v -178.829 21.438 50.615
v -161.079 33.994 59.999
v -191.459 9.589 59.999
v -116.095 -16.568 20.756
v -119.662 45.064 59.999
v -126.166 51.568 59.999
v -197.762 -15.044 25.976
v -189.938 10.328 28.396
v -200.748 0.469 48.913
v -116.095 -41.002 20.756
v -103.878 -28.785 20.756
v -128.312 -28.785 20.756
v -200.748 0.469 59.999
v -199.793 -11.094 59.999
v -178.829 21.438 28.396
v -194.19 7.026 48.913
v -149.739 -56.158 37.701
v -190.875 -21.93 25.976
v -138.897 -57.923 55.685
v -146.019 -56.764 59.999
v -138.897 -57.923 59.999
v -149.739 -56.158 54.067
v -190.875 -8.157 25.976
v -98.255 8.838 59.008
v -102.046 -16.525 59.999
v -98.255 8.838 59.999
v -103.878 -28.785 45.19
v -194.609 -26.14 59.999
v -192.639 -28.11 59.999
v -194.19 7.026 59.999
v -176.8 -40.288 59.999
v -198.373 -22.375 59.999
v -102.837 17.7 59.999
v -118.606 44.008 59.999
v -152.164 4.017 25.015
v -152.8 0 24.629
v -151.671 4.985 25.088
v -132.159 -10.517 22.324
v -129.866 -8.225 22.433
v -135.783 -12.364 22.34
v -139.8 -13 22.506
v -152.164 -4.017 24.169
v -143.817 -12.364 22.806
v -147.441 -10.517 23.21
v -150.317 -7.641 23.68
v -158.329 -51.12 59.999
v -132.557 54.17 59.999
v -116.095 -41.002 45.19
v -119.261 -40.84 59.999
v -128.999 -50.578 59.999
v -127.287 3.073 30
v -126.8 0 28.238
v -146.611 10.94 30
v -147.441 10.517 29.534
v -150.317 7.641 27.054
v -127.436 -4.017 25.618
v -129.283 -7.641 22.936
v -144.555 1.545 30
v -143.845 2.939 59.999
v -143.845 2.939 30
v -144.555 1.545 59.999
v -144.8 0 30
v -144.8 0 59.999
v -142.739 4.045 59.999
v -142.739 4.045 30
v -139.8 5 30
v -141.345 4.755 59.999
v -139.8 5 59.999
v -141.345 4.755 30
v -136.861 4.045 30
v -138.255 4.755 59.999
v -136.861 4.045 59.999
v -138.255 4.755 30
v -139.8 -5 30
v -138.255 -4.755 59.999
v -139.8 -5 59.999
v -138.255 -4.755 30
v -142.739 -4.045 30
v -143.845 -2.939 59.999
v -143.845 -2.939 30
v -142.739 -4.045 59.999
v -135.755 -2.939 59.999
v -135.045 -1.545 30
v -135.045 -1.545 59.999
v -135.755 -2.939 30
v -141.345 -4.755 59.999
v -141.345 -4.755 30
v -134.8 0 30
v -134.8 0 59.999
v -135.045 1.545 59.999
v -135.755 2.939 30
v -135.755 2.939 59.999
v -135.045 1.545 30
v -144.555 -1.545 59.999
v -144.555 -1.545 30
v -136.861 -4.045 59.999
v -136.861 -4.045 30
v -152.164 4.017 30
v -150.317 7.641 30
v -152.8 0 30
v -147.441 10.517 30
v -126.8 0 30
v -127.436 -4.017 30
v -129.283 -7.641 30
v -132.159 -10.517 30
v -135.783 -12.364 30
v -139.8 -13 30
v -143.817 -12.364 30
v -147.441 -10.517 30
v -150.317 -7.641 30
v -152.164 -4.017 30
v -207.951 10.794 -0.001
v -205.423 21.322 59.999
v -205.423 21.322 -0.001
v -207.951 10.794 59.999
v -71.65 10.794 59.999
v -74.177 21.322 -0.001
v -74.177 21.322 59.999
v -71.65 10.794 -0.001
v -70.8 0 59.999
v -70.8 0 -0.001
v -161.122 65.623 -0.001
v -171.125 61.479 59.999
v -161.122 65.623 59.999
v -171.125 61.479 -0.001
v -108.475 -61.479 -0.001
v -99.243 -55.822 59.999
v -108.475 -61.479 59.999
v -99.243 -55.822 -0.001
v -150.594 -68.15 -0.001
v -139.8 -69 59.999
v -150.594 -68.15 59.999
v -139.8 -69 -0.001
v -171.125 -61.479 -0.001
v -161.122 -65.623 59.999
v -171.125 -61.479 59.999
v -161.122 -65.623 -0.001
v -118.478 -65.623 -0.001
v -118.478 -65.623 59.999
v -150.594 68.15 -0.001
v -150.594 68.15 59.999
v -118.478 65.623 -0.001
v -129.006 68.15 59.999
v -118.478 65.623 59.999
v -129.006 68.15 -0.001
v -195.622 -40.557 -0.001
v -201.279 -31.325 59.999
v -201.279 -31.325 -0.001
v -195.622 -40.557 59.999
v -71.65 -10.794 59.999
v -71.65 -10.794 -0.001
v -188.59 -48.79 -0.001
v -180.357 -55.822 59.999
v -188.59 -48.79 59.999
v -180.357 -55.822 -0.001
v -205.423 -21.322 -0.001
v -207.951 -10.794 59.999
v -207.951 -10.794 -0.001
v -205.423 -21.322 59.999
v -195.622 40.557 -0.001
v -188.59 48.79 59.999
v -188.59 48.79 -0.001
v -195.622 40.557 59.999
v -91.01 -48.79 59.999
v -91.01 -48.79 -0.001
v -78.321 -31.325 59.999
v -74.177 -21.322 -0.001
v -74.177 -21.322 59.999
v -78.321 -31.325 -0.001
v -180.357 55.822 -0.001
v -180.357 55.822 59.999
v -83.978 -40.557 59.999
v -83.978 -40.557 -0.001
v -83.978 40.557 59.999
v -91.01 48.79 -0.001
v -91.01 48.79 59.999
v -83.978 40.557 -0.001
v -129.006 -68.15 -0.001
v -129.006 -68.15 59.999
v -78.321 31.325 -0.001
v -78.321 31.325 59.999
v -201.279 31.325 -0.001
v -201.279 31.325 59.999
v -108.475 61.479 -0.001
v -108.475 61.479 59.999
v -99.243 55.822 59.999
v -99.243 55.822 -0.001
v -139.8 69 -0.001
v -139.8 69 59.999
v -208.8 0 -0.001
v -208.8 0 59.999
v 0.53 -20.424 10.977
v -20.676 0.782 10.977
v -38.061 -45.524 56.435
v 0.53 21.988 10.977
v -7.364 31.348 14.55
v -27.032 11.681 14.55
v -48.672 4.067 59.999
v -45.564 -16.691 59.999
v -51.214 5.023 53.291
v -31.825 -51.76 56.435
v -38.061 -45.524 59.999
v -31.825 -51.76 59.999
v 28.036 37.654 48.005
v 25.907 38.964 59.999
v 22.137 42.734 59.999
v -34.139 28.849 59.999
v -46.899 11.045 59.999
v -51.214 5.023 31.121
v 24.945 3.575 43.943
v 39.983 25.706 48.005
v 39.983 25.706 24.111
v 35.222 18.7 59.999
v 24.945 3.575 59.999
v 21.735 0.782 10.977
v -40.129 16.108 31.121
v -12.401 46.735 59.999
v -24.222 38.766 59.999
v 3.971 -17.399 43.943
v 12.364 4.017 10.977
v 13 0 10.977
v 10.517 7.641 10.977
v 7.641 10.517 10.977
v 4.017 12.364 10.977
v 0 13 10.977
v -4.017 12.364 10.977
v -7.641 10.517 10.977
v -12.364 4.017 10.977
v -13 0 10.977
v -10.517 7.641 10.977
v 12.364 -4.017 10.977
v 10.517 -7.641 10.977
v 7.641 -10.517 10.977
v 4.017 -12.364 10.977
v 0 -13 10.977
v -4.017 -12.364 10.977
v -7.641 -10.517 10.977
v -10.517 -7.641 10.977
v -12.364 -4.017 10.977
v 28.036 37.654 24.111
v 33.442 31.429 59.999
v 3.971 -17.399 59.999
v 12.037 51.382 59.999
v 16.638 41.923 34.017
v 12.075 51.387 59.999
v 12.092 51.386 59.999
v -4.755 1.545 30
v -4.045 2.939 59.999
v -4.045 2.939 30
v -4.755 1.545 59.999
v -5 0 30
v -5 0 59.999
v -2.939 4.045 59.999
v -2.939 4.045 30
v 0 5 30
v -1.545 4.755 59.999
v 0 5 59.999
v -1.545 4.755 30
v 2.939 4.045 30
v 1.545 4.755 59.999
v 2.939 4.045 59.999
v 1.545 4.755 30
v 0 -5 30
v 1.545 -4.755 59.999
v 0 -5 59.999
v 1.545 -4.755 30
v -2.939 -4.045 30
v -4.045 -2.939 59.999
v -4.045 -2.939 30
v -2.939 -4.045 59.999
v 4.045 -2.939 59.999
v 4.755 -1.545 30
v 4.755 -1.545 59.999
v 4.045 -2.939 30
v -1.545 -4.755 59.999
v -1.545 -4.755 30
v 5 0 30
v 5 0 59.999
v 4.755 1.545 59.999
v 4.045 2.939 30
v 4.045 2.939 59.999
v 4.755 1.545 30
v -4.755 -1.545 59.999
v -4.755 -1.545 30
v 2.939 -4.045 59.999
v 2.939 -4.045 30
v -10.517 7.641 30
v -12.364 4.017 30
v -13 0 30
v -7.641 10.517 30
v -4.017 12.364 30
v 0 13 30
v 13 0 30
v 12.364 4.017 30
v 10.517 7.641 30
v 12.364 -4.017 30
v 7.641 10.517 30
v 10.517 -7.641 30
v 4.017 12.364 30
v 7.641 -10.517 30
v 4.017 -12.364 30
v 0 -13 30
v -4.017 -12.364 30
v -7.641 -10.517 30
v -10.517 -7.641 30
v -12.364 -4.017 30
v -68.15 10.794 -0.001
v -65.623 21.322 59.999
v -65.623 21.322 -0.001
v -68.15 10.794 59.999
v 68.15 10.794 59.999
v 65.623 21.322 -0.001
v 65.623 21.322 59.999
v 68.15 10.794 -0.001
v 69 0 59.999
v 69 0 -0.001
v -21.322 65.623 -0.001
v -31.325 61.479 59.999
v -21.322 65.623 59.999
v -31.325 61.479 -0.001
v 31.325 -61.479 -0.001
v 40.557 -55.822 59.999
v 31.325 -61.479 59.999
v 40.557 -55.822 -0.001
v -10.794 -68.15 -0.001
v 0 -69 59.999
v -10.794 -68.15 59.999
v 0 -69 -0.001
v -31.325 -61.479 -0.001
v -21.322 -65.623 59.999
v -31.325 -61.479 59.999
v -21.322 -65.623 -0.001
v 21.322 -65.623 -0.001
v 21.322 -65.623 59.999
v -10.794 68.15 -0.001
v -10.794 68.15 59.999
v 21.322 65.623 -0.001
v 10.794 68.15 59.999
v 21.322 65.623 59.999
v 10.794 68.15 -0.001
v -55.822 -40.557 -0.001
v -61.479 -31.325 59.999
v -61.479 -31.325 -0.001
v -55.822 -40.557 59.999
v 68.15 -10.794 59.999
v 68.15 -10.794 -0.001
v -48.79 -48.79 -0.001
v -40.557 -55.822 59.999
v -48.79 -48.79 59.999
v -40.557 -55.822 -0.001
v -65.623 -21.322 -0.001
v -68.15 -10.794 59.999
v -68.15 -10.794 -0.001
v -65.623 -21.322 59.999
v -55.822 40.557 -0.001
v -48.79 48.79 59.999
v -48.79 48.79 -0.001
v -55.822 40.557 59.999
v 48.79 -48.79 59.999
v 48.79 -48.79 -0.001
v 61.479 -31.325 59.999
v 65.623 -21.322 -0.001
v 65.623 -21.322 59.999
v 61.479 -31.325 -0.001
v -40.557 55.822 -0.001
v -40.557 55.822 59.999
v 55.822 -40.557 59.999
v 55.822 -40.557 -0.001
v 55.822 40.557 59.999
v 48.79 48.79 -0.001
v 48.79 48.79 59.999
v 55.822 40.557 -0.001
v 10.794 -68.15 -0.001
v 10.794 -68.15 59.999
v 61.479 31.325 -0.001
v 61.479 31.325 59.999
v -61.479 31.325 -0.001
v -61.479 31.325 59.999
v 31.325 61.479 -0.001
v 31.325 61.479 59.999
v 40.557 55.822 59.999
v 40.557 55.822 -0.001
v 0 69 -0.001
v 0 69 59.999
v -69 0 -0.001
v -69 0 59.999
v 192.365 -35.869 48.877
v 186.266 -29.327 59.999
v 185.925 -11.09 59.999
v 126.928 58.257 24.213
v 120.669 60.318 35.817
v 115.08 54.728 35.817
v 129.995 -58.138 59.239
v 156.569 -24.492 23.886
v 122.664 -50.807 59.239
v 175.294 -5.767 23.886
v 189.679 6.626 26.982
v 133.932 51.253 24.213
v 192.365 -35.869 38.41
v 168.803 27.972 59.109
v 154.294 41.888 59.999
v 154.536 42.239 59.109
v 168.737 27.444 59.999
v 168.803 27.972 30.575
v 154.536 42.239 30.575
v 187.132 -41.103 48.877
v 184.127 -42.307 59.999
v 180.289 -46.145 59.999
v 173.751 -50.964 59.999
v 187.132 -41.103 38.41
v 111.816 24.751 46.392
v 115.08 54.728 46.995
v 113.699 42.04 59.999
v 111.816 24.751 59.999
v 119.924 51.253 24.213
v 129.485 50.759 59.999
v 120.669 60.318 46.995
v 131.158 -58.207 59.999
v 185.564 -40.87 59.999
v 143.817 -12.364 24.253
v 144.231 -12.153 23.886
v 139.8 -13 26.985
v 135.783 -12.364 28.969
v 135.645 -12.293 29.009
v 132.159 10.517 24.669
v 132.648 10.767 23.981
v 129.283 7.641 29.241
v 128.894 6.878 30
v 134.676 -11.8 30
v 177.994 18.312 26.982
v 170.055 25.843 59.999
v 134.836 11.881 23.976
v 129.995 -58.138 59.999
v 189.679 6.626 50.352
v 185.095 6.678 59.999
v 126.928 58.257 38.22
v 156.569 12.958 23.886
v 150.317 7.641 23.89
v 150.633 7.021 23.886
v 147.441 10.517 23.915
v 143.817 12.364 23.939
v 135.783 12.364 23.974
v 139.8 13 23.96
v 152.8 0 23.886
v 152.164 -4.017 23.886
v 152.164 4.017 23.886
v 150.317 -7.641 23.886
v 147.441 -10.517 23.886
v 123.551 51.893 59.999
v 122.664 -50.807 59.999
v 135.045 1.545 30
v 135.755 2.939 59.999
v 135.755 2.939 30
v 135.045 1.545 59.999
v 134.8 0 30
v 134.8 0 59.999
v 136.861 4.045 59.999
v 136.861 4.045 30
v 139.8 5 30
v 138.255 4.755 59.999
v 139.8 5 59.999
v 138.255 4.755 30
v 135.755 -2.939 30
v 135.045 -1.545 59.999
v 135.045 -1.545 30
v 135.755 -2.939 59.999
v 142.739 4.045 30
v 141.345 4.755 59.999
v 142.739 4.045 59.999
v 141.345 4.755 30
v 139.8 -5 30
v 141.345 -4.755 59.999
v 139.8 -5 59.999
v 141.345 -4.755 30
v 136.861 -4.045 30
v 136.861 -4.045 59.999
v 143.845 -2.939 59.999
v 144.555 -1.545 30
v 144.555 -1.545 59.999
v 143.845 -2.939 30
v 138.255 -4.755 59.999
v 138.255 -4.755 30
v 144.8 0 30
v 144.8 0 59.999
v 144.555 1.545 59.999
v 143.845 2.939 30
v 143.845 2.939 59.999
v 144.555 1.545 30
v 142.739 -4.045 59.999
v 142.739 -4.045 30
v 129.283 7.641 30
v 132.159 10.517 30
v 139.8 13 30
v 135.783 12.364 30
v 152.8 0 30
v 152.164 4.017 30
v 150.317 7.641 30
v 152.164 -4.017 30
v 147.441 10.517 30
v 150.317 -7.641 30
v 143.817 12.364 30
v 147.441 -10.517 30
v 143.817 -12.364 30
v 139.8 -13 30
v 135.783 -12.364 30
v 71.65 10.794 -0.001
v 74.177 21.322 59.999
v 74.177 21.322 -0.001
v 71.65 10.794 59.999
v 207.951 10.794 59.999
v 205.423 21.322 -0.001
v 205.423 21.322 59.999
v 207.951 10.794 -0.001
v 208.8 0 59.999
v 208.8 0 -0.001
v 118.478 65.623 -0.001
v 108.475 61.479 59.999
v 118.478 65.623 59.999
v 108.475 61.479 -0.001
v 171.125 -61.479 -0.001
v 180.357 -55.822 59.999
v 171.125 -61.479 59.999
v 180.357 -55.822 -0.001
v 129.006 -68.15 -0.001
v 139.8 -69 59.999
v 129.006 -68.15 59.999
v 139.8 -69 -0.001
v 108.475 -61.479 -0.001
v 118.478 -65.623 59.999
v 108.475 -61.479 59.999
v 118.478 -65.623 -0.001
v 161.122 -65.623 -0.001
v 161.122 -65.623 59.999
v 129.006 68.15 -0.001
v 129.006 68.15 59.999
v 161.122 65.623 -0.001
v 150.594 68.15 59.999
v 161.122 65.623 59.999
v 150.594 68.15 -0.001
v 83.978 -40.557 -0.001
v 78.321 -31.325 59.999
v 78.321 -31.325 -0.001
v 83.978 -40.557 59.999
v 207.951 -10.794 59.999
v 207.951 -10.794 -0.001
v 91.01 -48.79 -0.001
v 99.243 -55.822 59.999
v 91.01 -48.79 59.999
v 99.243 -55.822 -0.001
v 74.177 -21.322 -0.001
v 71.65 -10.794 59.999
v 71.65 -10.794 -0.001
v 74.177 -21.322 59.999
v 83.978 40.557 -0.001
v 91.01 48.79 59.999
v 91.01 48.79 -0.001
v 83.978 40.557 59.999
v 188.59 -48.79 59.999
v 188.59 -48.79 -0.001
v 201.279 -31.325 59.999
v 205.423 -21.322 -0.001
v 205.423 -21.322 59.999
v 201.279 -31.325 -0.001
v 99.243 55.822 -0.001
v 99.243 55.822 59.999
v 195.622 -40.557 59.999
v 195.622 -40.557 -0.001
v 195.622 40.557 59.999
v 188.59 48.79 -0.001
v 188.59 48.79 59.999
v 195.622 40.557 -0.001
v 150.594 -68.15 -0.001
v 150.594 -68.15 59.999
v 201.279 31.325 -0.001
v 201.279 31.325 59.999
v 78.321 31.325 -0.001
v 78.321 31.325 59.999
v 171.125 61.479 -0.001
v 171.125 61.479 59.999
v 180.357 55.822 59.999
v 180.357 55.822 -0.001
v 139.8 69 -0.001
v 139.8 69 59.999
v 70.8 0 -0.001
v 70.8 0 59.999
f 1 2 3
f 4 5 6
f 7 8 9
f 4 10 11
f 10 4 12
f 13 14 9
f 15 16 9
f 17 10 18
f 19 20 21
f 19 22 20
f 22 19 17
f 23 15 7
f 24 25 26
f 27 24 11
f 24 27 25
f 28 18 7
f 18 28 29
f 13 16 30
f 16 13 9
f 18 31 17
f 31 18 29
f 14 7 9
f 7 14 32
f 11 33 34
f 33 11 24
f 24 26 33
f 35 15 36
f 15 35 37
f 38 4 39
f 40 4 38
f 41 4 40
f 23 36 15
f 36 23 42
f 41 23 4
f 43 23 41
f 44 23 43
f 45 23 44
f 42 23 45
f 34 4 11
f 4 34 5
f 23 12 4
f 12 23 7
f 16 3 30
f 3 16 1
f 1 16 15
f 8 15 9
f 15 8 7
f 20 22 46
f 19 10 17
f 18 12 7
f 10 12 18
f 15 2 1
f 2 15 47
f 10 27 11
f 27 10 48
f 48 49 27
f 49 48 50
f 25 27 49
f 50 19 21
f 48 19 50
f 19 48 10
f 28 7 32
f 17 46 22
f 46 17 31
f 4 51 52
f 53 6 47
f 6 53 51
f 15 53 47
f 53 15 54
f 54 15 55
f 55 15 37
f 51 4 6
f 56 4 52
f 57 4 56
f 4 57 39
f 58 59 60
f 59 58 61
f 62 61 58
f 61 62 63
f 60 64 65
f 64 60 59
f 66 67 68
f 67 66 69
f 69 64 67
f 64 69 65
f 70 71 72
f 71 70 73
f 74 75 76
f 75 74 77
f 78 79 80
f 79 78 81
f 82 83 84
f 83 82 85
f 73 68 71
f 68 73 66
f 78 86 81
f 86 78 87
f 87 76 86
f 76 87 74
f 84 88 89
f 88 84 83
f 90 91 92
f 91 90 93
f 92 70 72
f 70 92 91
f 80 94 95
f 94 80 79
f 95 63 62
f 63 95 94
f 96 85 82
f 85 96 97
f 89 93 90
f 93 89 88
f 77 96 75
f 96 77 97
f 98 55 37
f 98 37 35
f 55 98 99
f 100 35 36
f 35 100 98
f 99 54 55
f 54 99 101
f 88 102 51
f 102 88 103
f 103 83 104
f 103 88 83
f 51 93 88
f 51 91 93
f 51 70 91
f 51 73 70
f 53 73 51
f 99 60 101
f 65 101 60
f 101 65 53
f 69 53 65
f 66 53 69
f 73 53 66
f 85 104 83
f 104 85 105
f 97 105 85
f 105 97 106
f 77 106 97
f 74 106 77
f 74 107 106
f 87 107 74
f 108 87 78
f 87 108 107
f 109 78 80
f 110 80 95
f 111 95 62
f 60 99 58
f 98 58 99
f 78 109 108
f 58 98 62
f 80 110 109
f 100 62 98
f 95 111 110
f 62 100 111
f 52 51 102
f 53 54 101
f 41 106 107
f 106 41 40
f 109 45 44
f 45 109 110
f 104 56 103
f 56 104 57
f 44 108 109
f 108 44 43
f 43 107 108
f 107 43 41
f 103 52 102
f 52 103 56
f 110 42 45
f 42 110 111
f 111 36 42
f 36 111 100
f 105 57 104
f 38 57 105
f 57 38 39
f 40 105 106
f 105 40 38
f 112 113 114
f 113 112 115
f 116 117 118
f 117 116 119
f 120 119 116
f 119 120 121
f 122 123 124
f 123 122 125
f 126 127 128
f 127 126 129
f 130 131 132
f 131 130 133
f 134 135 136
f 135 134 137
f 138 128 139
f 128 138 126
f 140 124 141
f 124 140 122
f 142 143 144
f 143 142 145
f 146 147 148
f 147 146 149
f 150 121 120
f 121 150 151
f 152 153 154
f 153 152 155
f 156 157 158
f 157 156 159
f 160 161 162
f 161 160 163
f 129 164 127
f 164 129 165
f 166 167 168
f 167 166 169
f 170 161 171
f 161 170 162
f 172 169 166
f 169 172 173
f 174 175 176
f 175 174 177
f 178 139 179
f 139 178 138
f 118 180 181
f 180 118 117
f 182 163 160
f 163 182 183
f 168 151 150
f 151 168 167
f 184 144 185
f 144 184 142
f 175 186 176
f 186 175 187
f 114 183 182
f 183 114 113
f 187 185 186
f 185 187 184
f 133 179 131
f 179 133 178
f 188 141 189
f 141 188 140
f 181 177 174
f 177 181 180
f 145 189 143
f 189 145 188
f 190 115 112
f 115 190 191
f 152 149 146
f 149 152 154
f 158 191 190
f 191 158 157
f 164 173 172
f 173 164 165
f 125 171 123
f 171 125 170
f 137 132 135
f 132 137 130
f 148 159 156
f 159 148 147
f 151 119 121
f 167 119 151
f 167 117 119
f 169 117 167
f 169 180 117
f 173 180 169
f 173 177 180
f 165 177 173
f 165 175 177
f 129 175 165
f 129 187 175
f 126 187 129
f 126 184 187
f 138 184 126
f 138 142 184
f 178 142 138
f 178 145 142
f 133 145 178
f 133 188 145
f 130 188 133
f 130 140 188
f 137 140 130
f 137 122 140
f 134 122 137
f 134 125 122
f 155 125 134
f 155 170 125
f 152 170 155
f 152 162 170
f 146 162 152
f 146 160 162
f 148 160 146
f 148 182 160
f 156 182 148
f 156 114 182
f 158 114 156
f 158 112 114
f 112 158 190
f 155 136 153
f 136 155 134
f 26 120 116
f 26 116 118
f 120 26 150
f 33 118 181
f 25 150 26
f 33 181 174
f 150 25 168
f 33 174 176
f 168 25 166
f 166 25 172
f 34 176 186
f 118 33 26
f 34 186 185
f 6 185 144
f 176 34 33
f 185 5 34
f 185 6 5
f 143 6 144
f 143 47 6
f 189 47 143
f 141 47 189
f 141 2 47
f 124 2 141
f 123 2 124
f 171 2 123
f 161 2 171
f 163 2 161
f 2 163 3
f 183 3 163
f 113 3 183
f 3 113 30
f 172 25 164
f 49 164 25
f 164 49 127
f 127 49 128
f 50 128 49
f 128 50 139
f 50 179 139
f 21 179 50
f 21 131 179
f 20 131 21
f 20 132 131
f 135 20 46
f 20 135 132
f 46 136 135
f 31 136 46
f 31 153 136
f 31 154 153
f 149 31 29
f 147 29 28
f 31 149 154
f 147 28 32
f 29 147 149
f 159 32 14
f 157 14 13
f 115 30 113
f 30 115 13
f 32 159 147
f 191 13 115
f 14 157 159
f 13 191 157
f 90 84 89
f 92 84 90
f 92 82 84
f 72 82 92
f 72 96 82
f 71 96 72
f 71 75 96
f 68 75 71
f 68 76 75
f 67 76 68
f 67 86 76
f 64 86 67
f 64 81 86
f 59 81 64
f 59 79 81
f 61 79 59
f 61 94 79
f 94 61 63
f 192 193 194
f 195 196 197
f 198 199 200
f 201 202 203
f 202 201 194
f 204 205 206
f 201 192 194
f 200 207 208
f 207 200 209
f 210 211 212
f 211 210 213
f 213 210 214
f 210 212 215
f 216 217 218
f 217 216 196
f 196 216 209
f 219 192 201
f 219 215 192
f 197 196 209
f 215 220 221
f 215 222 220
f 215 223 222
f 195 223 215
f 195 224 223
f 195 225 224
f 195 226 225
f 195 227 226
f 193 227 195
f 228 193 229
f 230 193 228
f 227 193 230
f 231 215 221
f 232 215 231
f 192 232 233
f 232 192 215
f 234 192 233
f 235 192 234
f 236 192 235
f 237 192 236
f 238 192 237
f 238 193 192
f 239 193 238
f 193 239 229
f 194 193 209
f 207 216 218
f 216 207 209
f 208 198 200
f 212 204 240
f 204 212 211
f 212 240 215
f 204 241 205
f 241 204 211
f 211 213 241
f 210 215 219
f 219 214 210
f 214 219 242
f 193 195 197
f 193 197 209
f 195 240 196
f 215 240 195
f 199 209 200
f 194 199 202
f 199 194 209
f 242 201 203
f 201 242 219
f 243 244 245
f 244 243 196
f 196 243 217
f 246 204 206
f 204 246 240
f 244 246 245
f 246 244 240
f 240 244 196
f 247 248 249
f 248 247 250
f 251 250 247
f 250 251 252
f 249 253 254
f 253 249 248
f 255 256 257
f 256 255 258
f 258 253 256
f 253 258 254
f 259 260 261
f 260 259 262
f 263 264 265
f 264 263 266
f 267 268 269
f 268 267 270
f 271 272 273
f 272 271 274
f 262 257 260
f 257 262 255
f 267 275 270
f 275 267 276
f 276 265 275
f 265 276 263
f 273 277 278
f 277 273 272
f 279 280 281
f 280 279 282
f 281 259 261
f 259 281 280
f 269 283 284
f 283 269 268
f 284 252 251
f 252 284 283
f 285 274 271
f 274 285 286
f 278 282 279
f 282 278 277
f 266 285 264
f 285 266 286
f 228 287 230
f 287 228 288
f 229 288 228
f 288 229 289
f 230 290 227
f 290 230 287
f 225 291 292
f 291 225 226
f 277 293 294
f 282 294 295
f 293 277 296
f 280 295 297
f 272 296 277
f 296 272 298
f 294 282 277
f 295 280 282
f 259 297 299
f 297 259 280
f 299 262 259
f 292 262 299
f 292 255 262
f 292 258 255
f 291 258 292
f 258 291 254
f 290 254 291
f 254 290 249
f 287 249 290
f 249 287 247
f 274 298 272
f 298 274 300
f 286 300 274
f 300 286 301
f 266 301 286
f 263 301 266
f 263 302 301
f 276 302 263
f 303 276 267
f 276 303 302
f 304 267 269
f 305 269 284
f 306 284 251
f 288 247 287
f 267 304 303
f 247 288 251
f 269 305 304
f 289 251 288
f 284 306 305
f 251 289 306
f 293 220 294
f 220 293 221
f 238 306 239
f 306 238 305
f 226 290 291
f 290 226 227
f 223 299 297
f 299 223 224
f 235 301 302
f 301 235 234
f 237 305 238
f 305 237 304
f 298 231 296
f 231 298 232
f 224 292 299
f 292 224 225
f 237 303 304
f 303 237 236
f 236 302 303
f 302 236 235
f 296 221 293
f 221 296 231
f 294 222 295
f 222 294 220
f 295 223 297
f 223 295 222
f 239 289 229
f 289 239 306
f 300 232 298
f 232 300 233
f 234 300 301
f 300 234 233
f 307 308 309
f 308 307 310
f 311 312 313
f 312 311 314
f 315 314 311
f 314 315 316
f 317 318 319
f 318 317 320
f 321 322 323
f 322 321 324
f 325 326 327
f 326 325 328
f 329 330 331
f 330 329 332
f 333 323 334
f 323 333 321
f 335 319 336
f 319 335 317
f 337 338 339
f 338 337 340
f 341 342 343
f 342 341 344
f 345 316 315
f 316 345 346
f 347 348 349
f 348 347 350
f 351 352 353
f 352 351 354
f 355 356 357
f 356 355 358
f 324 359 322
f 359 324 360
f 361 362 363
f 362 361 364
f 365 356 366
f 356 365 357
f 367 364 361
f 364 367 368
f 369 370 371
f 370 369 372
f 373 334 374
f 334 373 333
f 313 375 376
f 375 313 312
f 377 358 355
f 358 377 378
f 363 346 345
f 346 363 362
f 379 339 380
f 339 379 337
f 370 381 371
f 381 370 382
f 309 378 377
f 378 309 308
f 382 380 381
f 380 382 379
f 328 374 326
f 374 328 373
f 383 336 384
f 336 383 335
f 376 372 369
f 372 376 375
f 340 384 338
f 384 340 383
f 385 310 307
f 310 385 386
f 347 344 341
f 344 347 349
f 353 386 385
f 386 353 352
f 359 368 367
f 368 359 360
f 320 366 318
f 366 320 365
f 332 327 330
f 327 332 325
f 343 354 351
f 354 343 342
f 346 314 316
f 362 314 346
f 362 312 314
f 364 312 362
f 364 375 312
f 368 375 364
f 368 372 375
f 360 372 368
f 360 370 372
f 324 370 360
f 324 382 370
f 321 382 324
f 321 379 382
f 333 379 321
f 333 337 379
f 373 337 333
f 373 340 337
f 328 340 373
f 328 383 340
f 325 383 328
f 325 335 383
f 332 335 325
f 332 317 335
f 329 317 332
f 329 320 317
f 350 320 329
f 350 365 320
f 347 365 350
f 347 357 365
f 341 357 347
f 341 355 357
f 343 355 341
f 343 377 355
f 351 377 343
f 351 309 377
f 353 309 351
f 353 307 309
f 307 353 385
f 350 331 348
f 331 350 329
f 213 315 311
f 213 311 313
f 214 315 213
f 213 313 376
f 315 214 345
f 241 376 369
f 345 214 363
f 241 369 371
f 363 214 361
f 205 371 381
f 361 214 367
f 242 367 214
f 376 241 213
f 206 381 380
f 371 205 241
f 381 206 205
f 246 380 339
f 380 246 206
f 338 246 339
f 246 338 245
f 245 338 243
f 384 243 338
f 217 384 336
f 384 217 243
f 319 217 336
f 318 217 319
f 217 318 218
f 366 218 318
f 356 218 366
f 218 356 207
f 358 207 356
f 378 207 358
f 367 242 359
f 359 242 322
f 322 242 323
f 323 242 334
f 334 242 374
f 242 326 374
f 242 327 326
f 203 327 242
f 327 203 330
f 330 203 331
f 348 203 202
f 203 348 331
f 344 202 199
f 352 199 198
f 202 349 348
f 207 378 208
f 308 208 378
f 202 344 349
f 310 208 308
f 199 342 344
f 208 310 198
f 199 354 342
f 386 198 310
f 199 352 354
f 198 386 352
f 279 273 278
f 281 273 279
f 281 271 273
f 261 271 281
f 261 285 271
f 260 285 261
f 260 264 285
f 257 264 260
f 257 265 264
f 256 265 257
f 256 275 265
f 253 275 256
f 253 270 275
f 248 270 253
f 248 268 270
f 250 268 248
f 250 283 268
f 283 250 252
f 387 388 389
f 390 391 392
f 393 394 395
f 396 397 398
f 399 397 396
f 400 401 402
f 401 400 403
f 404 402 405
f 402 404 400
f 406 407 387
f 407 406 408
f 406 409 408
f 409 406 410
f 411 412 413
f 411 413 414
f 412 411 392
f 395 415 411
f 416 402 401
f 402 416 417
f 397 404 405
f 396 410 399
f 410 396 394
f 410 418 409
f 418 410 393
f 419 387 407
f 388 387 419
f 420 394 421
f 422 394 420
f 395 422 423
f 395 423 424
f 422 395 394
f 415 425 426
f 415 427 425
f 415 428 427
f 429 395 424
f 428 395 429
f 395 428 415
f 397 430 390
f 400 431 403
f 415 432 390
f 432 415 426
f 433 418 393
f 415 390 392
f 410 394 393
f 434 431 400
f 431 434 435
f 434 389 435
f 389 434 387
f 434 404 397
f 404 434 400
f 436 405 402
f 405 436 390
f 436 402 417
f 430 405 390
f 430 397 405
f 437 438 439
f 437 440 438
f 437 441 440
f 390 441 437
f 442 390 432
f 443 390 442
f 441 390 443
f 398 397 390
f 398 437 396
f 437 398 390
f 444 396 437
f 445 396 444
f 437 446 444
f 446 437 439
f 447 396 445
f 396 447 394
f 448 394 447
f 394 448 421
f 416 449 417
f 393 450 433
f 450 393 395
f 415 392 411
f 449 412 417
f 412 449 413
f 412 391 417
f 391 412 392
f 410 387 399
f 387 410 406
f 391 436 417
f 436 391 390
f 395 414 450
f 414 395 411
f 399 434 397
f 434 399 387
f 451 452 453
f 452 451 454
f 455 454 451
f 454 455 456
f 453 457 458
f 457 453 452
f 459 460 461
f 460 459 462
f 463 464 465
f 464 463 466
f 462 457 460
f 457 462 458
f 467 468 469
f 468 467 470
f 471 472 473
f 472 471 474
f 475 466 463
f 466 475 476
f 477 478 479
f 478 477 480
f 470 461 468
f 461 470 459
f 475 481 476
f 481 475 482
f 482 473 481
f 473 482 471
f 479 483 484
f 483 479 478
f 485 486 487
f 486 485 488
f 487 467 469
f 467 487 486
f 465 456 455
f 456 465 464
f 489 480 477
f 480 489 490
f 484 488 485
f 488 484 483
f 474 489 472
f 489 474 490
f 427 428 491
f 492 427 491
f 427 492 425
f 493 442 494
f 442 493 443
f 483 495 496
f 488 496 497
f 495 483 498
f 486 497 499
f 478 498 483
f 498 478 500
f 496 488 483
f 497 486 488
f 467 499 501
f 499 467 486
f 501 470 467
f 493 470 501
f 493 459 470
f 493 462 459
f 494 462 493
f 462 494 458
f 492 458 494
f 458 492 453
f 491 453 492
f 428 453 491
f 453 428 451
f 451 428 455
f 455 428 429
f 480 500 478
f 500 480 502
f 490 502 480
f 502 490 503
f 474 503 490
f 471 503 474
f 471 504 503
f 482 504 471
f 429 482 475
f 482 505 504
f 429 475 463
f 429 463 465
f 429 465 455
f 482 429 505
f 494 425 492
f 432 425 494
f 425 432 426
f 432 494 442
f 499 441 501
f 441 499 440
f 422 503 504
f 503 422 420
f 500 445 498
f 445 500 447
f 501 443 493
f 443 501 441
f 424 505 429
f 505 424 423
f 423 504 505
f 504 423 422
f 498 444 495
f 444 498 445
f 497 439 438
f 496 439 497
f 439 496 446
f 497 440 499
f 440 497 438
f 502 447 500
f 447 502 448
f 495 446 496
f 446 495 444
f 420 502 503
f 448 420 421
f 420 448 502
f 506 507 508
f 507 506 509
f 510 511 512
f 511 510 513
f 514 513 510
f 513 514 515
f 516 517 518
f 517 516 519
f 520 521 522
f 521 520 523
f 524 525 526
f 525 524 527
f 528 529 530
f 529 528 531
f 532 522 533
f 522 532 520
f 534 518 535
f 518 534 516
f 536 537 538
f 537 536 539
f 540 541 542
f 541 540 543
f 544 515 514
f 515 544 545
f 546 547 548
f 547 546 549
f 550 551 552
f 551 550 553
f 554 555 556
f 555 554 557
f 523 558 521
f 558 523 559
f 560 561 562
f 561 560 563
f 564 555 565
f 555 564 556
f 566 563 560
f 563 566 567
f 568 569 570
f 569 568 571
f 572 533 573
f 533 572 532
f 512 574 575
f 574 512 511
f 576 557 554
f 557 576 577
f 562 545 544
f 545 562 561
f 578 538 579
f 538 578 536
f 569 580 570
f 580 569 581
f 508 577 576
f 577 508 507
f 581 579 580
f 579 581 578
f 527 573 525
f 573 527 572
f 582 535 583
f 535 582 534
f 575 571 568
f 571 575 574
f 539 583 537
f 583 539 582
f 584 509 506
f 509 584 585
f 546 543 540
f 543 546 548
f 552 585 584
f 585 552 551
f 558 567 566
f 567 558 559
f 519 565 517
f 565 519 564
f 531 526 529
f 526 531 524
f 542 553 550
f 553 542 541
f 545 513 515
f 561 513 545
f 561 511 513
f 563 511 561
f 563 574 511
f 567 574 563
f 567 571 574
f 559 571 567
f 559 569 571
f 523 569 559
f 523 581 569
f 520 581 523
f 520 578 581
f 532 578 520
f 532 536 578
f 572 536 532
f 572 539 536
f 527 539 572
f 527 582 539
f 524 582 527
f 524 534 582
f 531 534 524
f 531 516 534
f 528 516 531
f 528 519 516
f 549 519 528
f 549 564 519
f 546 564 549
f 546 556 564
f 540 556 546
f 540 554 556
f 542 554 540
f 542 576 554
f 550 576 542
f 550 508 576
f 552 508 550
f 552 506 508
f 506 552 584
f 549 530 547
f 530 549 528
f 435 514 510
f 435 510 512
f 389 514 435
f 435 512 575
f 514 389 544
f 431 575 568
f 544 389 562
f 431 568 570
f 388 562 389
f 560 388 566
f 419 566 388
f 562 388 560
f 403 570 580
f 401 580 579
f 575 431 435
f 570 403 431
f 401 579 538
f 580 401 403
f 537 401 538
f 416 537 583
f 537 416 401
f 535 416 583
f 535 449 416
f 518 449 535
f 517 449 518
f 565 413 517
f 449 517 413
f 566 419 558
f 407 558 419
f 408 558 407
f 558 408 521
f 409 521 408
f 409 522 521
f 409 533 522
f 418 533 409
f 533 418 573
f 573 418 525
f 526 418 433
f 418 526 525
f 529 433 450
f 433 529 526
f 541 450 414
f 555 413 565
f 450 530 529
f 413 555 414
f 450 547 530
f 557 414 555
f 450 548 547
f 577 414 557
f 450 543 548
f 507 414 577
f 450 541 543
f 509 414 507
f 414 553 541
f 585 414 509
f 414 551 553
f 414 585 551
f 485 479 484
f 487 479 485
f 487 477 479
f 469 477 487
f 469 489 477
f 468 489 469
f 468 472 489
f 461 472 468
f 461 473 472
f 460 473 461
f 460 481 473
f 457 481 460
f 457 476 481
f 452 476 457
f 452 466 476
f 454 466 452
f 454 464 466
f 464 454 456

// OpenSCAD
//Customizable Rock Climbing Hold v2.5
//2.4 had 400 downloads
//Improved over http://www.thingiverse.com/thing:487090
//Created by Ari M. Diacou, November 2014
//Shared under Creative Commons License: Attribution-ShareAlike 3.0 Unported (CC BY-SA 3.0) 
//see http://creativecommons.org/licenses/by-sa/3.0/

//Instructions at Bottom of file

// preview[view:north west, tilt:top diagonal]

/* [Hold Options] */
//Maximum(ish) size of hold in mm
Dmax=120;
//Changes hold thickness based on climb difficulty
difficulty=5.7;//[5.4,5.5,5.6,5.7,5.8,5.9,"5.10"]
//A way to save your random arrangement
seed=20;
//Diameter of the socket wrench you will tighten your bolt with in mm
head_diameter=26;
//Diameter of the hole that the bolt will fit into in mm
bore_diameter=10;
//Number of spheres
n=12;
//Parameter for scaling of element sizes (smaller makes spikier rocks)
a=7;//[1:10]
//Changes curviness of rocks (computation time goes up like O(Number_of_units_in_x*Number_of_units_in_y*$fn*n*log(n*$fn))
$fn=4;//[4,5,6,7,8,9,10,11,12,13,14,15,16,17,18,19,20]


/* [Array Options] */
Number_of_units_in_x = 3;//[1,2,3]
Number_of_units_in_y = 1;//[1,2,3]
print_type="molds";//[molds, tray, holds]
//How thick shold the walls of the mold be as a percentage of Rmax? Increase if you see any holes in your molds.
mold_thickness_ratio=0.15;

//A way to make a filename, just copy the output from the console before exporting. 
echo(str("filename suggestion:   Dmax=",Dmax,"_diff=",difficulty,"_seed=",seed,"_n=",n,"_",Number_of_units_in_x,"x",Number_of_units_in_y,"_",print_type));

                 /*[Hidden]*/
///////////////// Variables ///////////////////////
num_x=Number_of_units_in_x;
num_y=Number_of_units_in_y;
ep=.001+0;//A small amount, sometimes needed to remove shearing


array_num=num_x*num_y;
Rmax=Dmax/2;
vector=rands(0,1,3*array_num*n,seed);
//Figures how thin to make the hold based on the desired difficulty of the route
z_adjustment = (difficulty=="5.10" || difficulty-5.1<.04) ? 
	-0.4 :
	(difficulty-5.7)*(-4/3);
//Use lower resolution in testing mode for speed
//$fn= testing_mode ? 4 : 12;

///////////////////Main()/////////////////////////
for(i=[1:num_x]){
	for(j=[1:num_y]){
		if(print_type=="molds"){ 
//The (i-.5-num_x/2) term centers the array at x=0,y=0. The 1.1 ensures that the molds dont touch.
			translate([	(i-.5-num_x/2)*(1+1.1*mold_thickness_ratio)*Dmax,
							(j-.5-num_y/2)*(1+1.1*mold_thickness_ratio)*Dmax,
							Rmax])
				mold(i,j);
			}
		else if(print_type=="tray"){ 
//The (i-.5-num_x/2) term centers the array at x=0,y=0. The 0.95 ensures that the molds touch.
			rotate([180,0,0])
            translate([	(i-.5-num_x/2)*(1+0.95*mold_thickness_ratio)*Dmax,
							(j-.5-num_y/2)*(1+0.95*mold_thickness_ratio)*Dmax,
							-Dmax/2])
				difference(){
					union(){
//A cube and a cylinder are unioned so that a tray is formed when arrayed, the +ep in cube()ensures overlap, while the +ep in translate() ensures that shearing does not occur.
						translate([0,0,+Rmax/2+ep]) 
							cylinder(Rmax,r=(1+mold_thickness_ratio)*Rmax,center=true, $fn=40);
						translate([0,0,.5*mold_thickness_ratio*Rmax+ep]) 
							cube([	(1+mold_thickness_ratio)*Dmax+ep,
										(1+mold_thickness_ratio)*Dmax+ep,
										mold_thickness_ratio*Rmax], center=true);
						}

					translate([0,0,-ep]) rock((i-1)*(num_y)+j);
					};
			}
		else
			translate([(i-.5-num_x/2)*2*(1+mold_thickness_ratio)*Rmax,(j-.5-num_y/2)*2.1*Rmax,0])
				hold(i,j);
		}
	}

/////////////////Functions///////////////////////
module hold(x,y){
	difference(){
		translate([0,0,Rmax*z_adjustment])
			rock((x-1)*(num_y)+y);
//		if(testing_mode){echo(str("x=",x," ,y=",y));}
		//Remove the bottom to give a flat base
		translate([0,0,-Rmax*1.5]) 
			cube(Rmax*3,center=true);
		//Drill a hole for the bolt
		cylinder(r=bore_diameter/2,h=4*Rmax,center=true,$fn=20);
		//Counter-sink for the bolt head
		translate([0,0,Rmax*(0.5+z_adjustment)]) 
			cylinder(r=head_diameter/2,h=Rmax,$fn=20);
		}
	}

module rock(rock_number){
	/*Makes a rock by taking a hull around n elements, because OpenSCAD does not have runtime variables, I had to make a long vector with all possible random numbers, and then use the call of "rock_number" to specify a starting position in the vector*/
	v=vector;
	starting_position=3*(rock_number-1)*n;
//	if(testing_mode){echo(str("For rock #",rock_number,", starting position= ",starting_position," of ",len(v)));}
	hull(){
		for(i=[0:n-1]){ //For each i, pass a triplet to module element()
			element([v[starting_position+3*i+0],
						v[starting_position+3*i+1],
						v[starting_position+3*i+2]]);
			}
		}
	}

module element(v){
	//Sets up a sphere of radius R randomly placed in a cylinder
	//a triplet of random [0,1] numbers are converted to a cylindrical triplet
	//the cylinder has a radius of Rmax, and a height of 2*Rmax

	//Coordinates of a sphere in cylindrical coordinates
	r=Rmax*v[0]; 
	theta=360*v[1]; 
	z=(v[2]-0.5)*Rmax;
	//But OpenSCAD thinks in cartesian
	y=r*sin(theta);
	x=r*cos(theta);
	/*We have to wrap/hull() all of these spheres to make a rock. To make it aesthetically convincing, spheres at the edges of the allowed range should be smaller than those placed towards the center. I chose a gaussian distribution of sphere radius as a function of r/Rmax, which is simply v[0]. */
	R=.5*Rmax*exp(-v[0]*v[0]/(a/10));
	translate([x,y,z]) sphere(R);
	}


module mold(x,y){
	//Subtracts an upside-down hold from a cylinder to make a mold for pourable resin
	difference(){
		translate([0,0,-Rmax/2-ep]) cylinder(Rmax,r=(1+mold_thickness_ratio)*Rmax,center=true, $fn=40);
		rotate([0,180,0]) hold(x,y);
		}
	}


/*Instructions:

This program creates an array of rock-climbing holds to be 3D printed. The resulting holds are designed to be secured with a bolt and washer into a (presumably wood) rock-climbing wall. Since the holds need to never move, I imagine they will be secured with an impact-driver and socket-wrench. This requires hex bolts, which can be sharp when falling off of a wall. Therefore the holds are made already-countersunk.

There are 3 types of output: holds, molds, and tray. Holds are designed to be 3D printed at 100% infill. The molds are designed to be 3D printed in silicone (or other flexible material), filled with a resin, cured, and then removed from the mold. The tray is desinged to be printed with low infill of PLA/ABS, poured with a light coating of silicone or latex to make a flexible mold. The mold is then removed from the tray, coated with release agent, filled with resin, cured, and then removed from the tray. The holds will then need to be drilled and counter-sunk to make space for the bolt and socket wrench.

When using this program in OpenSCAD, a suggested filename is provided in the console, which reflects the most important parameters used when creating the STL files. To copy it, highlight the output, right-click, and then select “copy”. Ctrl-C will not work in Windows. Nor can you interact with the console when the “save file” window is up.

Theory:

The “rocks” are made by using the hull() function around n spheres, whose centers are randomly placed inside of a cylinder of Dmax width and  Dmax/4 height. Each sphere is made from a triplet of random numbers between 0 and 1. These numbers are then converted into a triplet of r, theta and z, which define the sphere's position in a cylinder. The radius of the sphere is a Gaussian function of the distance from the center of the sphere. The “a” parameter is related to the width of the Gaussian. Smaller “a” will mean smaller radii of the spheres at the edge, which will result in rocks that have sharper points. Aesthetically, I like a=7. Because the program doesn't “know” if the spheres will poke through the cylinder they were put in, a fudge-factor of mold_thickness_ratio is used. Adjust this higher is you find that some molds have holes in them, adjust lower if your molds are too thick, or to speed up printing. 

Once the “rock” is created, the bottom is sliced off to have the rock lie flush on the wall, and then a counter-bore cylinder and bolt hole are “drilled” into the hold so that the holds can be placed without drilling. The "difficulty" changes what percentage of the rock is sliced away. 5.7 slices the rock in half, 5.10 slices a lot away, leaving those annoying little nubs you find on 5.10s, and 5.4 makes orblike easysauce holds that you could climb with 2 limbs.

Hull() has a time of order n*log(n). Where n is the number of points being hull()ed. The number of points in a sphere is proprtional to $fn. Therefore the runtime of a single hold is O($fn*n*log(n*$fn)) and the total runtime is then O(Number_of_units_in_x *Number_of_units_in_y*$fn*n*log(n*$fn)). Therefore it is very important that these numbers not be set too high, or you will crash OpenSCAD.

OpenSCAD has 2 rendering modes, F5=Compile, and F6=Compile and Render. For most things, F5 is faster, for this project, F6 is faster for higher n, $fn. For 3 elements, n=12 and $fn=12 the rendering time on my computer using F5 was about 1 minute. F6 reported 3 seconds to render 3 elements, n=12 and $fn=20. I think because of some differnece in processing the elements inside hull(). As a result, if you are experimenting, and just rapidly want to see different holds (playing with “a” and “seed”), just turn on “testing mode=true” in the “Hold Options” section.

Because OpenSCAD does not have runtime variables, I had to make a long vector with all possible random numbers, and then use the call of "rock_number" to specify a starting position in the vector. The easy way, would be to pass a new random vector to each call of “rock” but you cant do that. The slightly more complicated way would be to be to make a vector of 3*n* Number_of_units_in_x *Number_of_units_in_y random numbers, and then break up the vector into pieces, and then pass those sub-vectors to “rock”. But OpenSCAD can't split vectors either. So I made a big long vector as a global variable, and then in various ways, effectively passed the position in the vector that rock() was supposed to read from. This is hackish bullshit and hard to parse, but it works. Also because of the lack of runtime variables, and the lack of string manipulation, it is impossible to figure out the actual height of a rock. Therefore the position of the counter-bore is just a guess (the 0.5 in hold()) and can be adjusted if you feel adventurous I didn't make a variable for it because I figured it's just easier to change the seed than explain what that parameter is. Also, for the same reason, the center of mass of the rock cant be obtained, and many bores will be off-center.
*/
